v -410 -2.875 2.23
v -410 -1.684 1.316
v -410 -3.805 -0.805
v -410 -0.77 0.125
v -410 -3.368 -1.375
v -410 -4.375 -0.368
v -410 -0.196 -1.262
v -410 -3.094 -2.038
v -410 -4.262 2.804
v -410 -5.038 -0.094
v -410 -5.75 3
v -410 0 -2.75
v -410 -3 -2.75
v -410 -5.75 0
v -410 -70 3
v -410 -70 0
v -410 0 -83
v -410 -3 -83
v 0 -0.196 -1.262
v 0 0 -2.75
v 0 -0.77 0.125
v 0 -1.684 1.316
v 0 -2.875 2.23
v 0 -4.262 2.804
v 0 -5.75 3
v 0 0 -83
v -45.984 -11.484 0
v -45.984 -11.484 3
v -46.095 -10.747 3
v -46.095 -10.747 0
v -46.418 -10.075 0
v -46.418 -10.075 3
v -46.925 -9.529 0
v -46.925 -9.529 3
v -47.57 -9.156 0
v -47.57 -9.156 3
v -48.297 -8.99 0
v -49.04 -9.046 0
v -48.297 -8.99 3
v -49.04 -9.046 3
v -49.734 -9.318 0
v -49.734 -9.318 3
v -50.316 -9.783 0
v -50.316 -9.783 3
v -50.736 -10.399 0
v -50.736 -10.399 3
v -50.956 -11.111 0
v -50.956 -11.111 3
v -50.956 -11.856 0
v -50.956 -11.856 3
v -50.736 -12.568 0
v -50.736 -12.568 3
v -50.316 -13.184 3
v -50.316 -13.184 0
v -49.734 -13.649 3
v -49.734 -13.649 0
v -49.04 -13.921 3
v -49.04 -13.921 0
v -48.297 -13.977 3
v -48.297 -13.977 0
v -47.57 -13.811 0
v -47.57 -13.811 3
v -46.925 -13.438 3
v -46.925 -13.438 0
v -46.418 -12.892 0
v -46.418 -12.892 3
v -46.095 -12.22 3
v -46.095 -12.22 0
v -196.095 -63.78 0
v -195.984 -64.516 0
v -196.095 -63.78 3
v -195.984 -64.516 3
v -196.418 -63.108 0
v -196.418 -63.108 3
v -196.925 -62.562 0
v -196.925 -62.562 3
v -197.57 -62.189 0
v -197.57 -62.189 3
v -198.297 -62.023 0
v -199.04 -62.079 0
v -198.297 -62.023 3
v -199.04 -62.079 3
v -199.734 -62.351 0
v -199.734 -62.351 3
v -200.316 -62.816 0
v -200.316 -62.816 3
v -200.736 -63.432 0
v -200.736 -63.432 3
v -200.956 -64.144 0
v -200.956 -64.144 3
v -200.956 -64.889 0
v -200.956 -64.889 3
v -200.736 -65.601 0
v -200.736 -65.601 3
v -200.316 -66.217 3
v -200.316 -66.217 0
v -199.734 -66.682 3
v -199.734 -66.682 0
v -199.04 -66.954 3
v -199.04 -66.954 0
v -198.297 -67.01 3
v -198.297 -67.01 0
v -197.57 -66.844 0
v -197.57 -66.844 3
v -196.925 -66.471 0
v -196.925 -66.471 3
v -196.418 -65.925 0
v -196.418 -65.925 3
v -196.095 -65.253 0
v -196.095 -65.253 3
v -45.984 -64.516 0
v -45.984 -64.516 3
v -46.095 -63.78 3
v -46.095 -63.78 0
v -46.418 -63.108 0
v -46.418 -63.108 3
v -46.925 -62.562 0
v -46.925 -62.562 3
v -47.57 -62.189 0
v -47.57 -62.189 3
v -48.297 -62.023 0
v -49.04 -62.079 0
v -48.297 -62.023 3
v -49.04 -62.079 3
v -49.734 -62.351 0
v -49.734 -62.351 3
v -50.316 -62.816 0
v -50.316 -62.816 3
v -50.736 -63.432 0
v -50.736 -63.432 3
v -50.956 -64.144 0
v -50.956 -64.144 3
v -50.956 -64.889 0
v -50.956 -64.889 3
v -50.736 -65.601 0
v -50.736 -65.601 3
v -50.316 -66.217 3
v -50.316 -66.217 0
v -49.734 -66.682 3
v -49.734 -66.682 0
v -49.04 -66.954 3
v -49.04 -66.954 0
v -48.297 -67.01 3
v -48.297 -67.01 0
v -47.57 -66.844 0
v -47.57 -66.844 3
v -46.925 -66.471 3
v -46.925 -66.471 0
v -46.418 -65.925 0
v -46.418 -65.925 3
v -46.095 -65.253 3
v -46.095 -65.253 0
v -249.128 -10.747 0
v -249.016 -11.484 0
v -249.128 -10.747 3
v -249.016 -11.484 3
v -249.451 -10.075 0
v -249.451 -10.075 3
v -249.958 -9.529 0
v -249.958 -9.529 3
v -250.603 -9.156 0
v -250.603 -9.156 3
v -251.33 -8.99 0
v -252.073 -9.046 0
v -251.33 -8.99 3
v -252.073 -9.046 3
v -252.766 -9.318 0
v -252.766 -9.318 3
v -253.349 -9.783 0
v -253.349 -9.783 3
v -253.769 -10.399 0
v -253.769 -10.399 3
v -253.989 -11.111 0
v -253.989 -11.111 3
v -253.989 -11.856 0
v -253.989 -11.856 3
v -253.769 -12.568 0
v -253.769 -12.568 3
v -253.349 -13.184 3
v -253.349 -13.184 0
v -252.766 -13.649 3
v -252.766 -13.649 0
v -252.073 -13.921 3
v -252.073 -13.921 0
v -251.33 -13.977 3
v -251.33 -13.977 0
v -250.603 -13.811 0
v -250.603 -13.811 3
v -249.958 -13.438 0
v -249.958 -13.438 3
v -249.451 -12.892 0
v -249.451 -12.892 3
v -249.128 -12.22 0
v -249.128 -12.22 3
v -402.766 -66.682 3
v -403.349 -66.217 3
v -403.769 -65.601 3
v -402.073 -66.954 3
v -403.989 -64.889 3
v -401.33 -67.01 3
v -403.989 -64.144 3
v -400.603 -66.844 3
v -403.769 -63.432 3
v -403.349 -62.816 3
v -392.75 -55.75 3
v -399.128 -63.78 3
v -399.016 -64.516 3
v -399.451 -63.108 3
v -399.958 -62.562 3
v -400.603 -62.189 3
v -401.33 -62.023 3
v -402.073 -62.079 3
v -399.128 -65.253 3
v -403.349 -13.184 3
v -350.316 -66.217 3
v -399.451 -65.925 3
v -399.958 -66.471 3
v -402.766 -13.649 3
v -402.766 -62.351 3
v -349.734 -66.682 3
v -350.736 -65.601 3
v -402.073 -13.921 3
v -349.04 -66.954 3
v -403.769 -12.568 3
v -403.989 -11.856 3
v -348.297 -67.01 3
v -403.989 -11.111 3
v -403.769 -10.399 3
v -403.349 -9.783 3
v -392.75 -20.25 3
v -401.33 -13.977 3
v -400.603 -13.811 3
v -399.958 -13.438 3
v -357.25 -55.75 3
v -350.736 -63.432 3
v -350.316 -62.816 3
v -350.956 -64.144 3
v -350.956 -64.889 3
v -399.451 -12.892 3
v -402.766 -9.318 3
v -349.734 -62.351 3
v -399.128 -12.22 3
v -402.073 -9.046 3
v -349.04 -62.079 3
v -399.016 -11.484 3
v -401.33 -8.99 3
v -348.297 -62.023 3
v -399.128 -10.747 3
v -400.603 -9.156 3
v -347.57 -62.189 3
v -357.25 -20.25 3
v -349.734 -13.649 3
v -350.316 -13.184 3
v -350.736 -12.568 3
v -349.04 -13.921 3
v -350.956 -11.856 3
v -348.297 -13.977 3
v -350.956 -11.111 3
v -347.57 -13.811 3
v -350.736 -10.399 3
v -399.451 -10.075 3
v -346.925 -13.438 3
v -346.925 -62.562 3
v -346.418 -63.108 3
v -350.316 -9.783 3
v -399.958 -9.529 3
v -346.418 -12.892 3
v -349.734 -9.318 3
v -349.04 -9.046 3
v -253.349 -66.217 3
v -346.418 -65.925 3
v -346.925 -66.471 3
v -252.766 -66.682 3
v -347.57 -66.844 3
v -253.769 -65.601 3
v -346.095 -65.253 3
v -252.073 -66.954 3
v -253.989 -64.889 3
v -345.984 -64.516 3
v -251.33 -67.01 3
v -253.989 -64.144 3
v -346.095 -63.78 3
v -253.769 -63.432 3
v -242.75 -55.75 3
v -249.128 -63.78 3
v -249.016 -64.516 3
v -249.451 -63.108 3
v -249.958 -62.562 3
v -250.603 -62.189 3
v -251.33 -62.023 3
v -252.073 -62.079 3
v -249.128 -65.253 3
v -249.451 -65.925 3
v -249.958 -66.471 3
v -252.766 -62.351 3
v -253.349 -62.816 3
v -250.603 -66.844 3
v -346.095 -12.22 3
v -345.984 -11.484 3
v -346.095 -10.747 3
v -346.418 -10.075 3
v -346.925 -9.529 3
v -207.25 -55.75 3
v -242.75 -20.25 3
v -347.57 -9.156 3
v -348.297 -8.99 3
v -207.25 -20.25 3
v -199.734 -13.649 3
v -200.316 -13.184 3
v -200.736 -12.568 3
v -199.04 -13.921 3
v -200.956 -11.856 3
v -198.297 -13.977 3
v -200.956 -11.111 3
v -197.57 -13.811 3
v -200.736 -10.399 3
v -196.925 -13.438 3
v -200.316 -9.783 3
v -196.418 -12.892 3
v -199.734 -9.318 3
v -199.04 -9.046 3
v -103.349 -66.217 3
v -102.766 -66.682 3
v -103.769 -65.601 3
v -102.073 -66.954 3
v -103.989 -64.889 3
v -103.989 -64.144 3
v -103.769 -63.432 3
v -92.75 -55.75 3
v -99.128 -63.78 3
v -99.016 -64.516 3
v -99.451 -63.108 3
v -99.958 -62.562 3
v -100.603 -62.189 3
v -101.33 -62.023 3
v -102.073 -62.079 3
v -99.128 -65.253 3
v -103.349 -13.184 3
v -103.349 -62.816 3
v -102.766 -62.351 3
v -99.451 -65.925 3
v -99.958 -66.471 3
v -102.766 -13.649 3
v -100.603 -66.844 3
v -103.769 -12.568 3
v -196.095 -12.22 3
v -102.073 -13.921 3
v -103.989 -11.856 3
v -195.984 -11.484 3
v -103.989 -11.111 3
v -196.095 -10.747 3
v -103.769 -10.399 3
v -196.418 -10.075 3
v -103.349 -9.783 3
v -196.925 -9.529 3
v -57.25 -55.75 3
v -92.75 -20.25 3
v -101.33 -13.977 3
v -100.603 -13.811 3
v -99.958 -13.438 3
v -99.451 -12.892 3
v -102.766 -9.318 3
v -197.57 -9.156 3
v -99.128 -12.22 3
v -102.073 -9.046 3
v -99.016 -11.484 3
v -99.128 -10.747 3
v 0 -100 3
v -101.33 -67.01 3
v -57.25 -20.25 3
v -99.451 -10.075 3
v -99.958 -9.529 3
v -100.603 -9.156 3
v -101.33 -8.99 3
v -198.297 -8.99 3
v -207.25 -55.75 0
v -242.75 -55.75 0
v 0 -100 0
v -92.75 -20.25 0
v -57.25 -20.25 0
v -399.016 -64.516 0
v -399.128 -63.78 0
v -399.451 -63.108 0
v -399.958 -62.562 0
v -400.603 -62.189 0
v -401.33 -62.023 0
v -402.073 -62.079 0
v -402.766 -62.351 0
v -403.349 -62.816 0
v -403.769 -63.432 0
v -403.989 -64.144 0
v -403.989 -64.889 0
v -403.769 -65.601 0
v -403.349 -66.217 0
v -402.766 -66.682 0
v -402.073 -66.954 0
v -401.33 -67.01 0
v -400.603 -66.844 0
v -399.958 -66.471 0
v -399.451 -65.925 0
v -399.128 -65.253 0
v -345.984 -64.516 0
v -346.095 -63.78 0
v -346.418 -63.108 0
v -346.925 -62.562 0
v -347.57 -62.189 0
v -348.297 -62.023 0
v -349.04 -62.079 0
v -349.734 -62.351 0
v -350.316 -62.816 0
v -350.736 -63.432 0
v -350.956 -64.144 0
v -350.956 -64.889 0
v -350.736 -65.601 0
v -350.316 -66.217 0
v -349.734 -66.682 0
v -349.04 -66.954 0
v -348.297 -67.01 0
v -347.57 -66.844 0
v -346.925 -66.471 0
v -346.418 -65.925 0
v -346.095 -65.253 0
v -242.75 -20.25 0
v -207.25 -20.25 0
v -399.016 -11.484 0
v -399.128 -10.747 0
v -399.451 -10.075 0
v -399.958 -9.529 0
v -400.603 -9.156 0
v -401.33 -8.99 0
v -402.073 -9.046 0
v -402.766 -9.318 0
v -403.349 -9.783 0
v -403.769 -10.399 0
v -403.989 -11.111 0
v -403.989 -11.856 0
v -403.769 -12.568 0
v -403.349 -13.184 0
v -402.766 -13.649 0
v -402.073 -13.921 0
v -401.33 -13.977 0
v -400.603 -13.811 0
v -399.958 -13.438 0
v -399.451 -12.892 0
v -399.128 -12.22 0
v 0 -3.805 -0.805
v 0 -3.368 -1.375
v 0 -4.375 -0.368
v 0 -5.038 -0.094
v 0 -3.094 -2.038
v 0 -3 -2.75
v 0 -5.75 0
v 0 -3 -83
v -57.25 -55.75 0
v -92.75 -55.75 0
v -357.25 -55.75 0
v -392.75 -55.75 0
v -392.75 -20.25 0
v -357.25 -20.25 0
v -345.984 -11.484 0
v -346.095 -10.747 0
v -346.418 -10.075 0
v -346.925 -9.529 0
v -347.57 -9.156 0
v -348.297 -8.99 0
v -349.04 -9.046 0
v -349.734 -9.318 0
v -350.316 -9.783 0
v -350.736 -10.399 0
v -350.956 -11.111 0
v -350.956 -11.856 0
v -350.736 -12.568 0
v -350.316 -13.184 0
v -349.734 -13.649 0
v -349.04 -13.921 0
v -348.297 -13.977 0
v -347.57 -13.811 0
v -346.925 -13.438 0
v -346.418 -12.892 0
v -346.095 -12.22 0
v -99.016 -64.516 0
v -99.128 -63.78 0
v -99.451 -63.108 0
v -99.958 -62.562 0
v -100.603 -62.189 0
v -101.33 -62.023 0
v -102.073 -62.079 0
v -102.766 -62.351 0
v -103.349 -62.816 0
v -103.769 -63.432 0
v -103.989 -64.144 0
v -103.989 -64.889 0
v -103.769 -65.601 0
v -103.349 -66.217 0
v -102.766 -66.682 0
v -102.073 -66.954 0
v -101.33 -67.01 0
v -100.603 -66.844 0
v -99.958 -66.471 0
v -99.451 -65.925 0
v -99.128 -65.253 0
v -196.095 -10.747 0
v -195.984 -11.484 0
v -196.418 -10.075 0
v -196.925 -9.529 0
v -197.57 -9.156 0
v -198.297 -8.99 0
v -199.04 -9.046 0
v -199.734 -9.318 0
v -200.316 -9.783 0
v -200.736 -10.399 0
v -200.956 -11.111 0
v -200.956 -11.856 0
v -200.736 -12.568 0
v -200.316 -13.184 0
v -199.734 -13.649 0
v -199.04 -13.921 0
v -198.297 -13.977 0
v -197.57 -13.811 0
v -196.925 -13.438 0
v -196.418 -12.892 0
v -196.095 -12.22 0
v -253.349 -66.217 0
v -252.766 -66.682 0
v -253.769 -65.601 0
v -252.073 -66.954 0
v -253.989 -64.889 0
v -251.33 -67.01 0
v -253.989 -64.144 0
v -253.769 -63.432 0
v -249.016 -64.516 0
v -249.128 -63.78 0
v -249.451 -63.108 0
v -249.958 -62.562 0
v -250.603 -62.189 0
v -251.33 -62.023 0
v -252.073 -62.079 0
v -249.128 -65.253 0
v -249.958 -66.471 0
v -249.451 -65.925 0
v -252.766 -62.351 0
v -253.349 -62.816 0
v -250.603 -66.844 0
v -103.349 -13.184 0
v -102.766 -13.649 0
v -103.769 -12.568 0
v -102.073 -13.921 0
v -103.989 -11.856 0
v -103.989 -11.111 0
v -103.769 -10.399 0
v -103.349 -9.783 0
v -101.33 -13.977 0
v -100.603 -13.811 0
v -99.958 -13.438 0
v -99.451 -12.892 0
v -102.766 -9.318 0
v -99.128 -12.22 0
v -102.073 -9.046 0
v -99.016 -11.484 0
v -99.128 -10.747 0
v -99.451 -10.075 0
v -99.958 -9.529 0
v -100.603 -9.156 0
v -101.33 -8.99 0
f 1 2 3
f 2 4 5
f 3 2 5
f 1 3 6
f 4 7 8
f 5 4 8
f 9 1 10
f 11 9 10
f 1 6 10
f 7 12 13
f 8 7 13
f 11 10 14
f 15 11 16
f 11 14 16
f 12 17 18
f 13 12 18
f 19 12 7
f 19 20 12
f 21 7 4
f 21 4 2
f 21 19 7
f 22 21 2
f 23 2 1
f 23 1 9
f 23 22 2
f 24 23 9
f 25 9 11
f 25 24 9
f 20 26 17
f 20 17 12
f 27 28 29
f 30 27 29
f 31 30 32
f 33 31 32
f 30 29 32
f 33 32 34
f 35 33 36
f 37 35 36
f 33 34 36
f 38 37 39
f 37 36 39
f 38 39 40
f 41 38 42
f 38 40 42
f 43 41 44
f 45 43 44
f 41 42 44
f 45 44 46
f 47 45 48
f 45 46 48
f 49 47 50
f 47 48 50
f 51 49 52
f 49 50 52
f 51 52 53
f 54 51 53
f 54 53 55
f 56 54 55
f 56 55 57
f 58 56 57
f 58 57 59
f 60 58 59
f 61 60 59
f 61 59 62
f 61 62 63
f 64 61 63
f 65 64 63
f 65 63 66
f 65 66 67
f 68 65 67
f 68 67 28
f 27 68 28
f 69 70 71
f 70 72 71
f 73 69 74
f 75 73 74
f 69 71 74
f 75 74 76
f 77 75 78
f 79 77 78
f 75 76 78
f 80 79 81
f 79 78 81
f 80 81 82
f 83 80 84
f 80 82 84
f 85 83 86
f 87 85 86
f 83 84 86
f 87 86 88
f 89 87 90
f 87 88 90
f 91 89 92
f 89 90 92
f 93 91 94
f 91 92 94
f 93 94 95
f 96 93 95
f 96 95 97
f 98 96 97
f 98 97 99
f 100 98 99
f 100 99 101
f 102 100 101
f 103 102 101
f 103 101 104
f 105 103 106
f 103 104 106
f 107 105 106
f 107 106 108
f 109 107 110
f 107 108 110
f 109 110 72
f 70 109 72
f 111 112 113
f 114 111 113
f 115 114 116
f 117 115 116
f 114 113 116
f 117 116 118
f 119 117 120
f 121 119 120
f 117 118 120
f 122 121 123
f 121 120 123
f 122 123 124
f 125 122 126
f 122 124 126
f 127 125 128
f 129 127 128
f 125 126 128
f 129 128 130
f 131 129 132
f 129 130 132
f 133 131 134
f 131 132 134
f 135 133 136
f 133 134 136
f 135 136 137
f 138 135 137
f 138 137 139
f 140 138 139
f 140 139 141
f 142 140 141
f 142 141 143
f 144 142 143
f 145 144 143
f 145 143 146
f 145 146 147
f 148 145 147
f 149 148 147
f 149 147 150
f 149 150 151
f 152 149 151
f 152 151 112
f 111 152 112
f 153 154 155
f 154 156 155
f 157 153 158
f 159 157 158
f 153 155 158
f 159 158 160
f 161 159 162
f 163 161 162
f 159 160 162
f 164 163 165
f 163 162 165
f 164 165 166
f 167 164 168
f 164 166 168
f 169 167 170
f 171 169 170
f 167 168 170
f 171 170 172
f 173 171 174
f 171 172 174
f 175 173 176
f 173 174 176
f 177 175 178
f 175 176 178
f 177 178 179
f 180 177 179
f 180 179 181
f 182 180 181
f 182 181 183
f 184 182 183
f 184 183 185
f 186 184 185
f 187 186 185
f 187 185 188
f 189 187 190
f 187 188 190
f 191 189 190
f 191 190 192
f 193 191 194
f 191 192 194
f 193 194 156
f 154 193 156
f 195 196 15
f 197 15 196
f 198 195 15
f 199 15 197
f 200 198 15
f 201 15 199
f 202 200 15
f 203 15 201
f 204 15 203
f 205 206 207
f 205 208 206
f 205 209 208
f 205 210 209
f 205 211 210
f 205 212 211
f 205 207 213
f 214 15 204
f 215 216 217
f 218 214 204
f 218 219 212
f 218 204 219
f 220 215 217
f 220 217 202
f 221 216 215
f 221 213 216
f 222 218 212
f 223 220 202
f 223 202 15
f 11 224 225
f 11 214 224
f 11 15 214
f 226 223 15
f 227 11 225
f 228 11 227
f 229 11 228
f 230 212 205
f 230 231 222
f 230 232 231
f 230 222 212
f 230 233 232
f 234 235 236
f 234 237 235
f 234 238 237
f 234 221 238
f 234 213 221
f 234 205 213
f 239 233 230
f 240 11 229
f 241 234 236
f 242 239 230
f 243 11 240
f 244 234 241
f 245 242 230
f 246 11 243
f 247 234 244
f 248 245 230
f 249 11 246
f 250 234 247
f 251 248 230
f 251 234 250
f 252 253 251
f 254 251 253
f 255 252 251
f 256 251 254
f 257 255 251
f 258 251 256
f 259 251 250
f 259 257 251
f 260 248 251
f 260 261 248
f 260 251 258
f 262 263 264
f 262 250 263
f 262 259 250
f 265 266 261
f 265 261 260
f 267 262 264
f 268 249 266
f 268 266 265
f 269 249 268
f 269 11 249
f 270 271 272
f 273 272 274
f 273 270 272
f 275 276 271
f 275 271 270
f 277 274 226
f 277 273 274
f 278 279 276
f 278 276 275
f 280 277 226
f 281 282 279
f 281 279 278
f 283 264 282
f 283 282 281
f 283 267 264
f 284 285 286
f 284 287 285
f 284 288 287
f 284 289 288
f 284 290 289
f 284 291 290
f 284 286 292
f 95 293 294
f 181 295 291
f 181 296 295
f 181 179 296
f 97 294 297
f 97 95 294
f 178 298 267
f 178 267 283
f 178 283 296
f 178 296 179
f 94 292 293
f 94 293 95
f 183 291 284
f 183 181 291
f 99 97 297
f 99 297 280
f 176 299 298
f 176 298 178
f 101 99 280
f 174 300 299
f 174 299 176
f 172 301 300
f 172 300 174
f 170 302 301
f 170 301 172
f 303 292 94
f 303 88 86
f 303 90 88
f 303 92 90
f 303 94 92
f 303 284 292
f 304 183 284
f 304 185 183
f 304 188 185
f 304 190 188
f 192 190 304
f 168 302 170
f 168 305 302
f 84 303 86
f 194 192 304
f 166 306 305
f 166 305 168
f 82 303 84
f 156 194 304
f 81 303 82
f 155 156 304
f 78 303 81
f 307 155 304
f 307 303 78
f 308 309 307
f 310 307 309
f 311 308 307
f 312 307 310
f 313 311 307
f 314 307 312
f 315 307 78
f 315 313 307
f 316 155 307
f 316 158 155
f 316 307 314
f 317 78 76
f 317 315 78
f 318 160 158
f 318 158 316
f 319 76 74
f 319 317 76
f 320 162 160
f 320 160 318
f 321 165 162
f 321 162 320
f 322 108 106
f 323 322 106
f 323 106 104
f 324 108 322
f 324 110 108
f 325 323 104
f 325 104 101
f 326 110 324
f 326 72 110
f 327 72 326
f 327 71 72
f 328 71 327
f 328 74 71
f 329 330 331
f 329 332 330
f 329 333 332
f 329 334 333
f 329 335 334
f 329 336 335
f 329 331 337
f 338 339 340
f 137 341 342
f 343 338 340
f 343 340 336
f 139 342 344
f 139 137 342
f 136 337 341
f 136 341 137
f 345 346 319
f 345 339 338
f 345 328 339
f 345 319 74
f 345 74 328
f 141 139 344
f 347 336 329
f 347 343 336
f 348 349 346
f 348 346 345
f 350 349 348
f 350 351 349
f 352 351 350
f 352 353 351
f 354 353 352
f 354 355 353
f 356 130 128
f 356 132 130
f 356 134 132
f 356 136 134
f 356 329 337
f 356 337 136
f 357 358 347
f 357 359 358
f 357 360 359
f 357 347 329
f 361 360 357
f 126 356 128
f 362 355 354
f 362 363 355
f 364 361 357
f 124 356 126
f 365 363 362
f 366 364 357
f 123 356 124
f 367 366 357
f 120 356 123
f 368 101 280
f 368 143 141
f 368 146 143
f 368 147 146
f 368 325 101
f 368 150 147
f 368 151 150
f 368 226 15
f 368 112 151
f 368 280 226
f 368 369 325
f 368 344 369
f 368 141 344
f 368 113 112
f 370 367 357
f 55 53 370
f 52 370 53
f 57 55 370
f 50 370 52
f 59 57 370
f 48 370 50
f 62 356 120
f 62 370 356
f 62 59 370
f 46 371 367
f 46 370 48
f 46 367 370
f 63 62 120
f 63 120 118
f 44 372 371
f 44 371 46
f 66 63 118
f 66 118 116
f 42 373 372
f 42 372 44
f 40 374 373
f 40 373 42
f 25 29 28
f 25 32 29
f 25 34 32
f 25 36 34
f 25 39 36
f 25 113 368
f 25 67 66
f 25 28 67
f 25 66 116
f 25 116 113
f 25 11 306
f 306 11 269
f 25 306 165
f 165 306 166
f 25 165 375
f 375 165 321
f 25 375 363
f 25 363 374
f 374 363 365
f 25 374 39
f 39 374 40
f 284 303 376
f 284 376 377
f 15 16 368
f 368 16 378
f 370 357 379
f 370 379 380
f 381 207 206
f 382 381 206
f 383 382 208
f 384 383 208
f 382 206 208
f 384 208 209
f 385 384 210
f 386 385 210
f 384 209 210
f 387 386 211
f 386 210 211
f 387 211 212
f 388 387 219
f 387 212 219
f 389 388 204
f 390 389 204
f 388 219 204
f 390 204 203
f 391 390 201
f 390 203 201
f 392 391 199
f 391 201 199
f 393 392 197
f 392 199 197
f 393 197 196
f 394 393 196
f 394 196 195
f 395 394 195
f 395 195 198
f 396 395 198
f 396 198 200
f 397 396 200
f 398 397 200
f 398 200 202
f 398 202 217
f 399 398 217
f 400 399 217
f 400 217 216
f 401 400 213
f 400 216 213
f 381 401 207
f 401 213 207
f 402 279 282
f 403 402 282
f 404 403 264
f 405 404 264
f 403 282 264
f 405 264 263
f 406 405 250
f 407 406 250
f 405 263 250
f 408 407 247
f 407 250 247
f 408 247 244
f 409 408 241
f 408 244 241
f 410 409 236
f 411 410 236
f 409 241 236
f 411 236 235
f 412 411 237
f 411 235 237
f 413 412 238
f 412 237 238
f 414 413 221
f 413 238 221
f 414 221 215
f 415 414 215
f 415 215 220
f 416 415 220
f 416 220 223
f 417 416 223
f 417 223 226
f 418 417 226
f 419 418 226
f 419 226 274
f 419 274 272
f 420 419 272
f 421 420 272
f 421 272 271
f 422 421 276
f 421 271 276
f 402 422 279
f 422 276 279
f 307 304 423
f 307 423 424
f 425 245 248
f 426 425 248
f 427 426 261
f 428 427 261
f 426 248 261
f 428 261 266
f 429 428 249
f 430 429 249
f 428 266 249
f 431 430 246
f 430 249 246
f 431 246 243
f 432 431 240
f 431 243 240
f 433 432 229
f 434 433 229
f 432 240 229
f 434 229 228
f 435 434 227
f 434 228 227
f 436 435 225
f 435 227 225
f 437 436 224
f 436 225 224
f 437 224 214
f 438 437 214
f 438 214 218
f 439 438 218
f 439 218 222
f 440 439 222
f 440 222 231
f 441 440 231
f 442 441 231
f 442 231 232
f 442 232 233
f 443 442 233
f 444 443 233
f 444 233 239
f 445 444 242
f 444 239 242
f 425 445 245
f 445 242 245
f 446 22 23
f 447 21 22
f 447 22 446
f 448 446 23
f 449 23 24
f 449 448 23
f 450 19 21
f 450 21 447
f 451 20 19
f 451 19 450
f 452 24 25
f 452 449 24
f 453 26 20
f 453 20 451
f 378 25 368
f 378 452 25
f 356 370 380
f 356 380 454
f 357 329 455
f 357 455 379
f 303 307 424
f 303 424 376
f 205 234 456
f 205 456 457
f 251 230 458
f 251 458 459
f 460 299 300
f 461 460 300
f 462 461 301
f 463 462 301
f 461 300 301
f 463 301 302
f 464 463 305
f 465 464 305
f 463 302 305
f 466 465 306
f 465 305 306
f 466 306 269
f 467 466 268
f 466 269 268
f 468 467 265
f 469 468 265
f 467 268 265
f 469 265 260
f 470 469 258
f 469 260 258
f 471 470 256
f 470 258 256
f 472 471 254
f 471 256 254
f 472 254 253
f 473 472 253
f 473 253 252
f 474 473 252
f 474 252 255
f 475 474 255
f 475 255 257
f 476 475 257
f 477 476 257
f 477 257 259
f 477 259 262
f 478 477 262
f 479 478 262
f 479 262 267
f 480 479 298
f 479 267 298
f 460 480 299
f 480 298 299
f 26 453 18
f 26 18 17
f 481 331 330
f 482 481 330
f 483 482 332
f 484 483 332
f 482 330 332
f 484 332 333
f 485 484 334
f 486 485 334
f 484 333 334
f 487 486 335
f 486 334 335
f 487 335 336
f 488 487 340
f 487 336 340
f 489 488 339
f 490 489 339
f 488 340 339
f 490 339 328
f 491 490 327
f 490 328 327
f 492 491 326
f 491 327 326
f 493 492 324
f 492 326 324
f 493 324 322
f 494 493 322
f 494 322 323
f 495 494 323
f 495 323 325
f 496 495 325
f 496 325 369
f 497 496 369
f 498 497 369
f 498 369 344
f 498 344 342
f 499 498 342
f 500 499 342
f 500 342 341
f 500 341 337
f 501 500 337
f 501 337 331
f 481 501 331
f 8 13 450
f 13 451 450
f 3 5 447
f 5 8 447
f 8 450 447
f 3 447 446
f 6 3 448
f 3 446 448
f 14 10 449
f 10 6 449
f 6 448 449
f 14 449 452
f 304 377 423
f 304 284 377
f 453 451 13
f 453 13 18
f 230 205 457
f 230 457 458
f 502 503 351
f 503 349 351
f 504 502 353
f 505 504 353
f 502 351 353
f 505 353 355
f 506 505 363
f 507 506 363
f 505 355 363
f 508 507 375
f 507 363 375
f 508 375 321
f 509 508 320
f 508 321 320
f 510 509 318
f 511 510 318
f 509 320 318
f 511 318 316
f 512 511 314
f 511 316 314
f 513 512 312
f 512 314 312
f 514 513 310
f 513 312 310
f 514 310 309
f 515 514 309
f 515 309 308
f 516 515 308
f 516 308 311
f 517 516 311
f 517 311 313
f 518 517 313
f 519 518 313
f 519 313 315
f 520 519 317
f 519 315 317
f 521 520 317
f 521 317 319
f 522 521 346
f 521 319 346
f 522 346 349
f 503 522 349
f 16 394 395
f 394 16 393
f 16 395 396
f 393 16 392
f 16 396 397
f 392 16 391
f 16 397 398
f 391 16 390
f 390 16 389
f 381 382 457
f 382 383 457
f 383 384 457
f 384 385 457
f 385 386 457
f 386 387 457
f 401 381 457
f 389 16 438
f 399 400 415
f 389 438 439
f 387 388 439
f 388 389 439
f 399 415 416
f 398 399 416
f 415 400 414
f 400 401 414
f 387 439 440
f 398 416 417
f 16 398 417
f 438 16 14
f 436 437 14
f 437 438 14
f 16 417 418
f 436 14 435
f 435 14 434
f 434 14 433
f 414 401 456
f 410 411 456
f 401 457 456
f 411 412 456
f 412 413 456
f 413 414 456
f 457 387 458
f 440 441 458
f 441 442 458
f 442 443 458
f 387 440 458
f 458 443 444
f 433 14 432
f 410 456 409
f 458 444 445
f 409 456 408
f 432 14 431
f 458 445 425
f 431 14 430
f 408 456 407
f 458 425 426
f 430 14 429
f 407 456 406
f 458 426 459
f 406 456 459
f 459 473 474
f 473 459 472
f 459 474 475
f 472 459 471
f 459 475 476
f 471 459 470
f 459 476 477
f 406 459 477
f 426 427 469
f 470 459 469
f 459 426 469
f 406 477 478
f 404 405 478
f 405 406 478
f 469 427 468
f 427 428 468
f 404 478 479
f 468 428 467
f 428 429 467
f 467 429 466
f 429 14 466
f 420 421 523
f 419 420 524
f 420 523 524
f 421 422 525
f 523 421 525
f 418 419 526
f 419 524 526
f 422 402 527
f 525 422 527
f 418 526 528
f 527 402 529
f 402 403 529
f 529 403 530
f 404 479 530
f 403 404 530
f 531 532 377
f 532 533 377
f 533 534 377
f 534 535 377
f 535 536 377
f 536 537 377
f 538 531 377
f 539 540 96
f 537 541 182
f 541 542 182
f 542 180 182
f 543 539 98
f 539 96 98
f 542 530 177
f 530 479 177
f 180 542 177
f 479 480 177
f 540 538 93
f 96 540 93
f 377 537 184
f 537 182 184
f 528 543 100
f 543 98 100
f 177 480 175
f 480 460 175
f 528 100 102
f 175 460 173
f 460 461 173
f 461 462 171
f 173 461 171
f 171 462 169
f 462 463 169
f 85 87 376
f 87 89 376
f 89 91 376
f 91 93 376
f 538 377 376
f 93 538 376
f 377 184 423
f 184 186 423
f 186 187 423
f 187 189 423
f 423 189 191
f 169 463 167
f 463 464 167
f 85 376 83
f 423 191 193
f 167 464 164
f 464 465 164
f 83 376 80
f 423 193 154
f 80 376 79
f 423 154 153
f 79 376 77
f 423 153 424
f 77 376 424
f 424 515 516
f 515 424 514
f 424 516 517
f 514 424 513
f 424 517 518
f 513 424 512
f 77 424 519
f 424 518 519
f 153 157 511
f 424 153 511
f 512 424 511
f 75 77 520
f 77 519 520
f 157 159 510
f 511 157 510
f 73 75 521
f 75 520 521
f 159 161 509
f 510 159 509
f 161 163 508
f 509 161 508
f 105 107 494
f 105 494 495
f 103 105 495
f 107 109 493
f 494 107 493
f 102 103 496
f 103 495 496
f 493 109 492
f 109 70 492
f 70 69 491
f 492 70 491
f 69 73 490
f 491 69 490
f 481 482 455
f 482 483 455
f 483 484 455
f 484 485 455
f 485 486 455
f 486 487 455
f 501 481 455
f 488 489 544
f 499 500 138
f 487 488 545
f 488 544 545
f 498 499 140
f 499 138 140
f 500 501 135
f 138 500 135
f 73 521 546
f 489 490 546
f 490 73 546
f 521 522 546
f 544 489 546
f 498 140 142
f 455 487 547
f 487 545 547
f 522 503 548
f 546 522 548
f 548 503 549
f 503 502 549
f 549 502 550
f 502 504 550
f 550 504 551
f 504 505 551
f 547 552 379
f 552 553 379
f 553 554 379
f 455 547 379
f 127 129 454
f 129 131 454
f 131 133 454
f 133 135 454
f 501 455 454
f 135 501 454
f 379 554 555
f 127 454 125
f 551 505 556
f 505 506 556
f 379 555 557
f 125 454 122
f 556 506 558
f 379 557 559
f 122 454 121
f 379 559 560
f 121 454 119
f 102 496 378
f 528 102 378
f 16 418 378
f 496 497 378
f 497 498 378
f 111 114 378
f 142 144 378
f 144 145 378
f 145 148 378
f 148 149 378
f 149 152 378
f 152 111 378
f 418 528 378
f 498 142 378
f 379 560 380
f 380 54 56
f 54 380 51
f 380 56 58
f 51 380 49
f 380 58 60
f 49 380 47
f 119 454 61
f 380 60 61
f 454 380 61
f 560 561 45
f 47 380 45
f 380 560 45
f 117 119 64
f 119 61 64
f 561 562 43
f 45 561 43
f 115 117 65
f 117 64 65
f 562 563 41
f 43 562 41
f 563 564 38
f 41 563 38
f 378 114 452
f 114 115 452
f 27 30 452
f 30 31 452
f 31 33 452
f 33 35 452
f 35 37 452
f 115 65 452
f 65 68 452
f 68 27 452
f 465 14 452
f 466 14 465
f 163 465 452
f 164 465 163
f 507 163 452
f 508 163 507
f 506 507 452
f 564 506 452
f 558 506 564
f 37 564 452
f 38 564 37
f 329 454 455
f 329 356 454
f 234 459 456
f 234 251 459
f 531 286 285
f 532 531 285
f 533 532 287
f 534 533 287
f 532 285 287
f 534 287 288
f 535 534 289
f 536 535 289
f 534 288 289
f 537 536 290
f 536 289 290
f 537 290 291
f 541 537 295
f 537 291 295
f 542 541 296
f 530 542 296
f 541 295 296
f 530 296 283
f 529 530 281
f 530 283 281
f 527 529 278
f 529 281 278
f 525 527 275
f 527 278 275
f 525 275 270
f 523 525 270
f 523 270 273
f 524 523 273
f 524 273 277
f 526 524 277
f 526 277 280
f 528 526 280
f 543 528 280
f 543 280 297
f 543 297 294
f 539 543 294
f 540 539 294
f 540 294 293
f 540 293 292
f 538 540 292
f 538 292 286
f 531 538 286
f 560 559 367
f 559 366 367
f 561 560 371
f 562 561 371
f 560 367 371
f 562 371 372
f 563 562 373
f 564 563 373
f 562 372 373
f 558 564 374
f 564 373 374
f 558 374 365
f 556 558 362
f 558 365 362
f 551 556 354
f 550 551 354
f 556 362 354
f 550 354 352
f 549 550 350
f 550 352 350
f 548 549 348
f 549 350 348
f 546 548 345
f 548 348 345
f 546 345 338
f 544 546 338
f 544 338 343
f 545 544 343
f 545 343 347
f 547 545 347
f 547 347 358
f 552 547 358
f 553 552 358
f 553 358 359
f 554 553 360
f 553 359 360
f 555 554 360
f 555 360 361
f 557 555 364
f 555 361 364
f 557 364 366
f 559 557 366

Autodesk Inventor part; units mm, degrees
ref_plane "YZ Plane" through (0, 0, 0) normal (1, 0, 0) x (0, 1, 0)
ref_plane "XZ Plane" through (0, 0, 0) normal (0, 1, 0) x (-1, 0, 0)
ref_plane "XY Plane" through (0, 0, 0) normal (0, 0, 1) x (1, 0, 0)
sketch "Sketch1" plane through (0, 0, 0) normal (0, 0, 1) x (1, 0, 0)
  line L0 (0, 0) -> (-410, 0)
  line L1 (0, -100) -> (0, 0)
  line L2 (-410, 0) -> (-410, -70)
  line L3 (-410, -70) -> (0, -100)
  point P0 (0, -50)
  dimension "d32" = 100
  dimension "d60" = 70
  dimension "d61" = 410
extrude "Plate1" add sketch "Sketch1" along normal blind 3
sketch "Sketch8" plane through (0, 0, 3) normal (0, 0, 1) x (1, 0, 0)
  line L0 (-57.25, -55.75) -> (-92.75, -55.75)
  line L1 (-92.75, -55.75) -> (-92.75, -20.25)
  line L2 (-92.75, -20.25) -> (-57.25, -20.25)
  line L3 (-57.25, -20.25) -> (-57.25, -55.75)
  line L4 (-57.25, -55.75) -> (-92.75, -20.25) construction
  line L5 (-92.75, -55.75) -> (-57.25, -20.25) construction
  circle A0 centre (-48.4835, -64.5165) radius 2.5
  circle A1 centre (-101.5165, -64.5165) radius 2.5
  circle A2 centre (-101.5165, -11.4835) radius 2.5
  circle A3 centre (-48.4835, -11.4835) radius 2.5
  circle A4 centre (-75, -38) radius 37.5 construction
  line L6 (0, 0) -> (0, -100) projected
  line L7 (-410, 0) -> (0, 0) projected
  line L8 (-92.75, -55.75) -> (-101.5165, -64.5165) construction
  dimension "d51" = 35.5
  dimension "d52" = 35.5
  dimension "d53" = 5
  dimension "d72" = 75
  dimension "d73" = 38
  dimension "d74" = 12.3977
  dimension "d75" = 75
extrude "Cut3" cut sketch "Sketch8" against normal blind 3
pattern_linear "Rectangular Pattern1" count 3 spacing 150 along (-1, 0, 0) of "Cut3"
sketch "Sketch9" plane through (0, -3, 3) normal (0, 1, 0) x (-1, 0, 0)
  line L0 (410, 0) -> (0, 0)
  line L1 (0, 0) -> (0, -86)
  line L2 (0, -86) -> (410, -86)
  line L3 (410, -86) -> (410, 0)
edge flange "Flange3" height 86 angle 90 thickness 3 bend radius 2.75 thickness toward (0, 1, 0) relief round relief width 3 relief depth 1.5 edges at (-205, 0, 0) wall of the first edge with corners at (-410, -3, 3) (0, -3, 3) (0, -3, -83) (-410, -3, -83)
bend "Bend3"
corner "Corner3"
equation "\"d32\" = Main_way_hight"
equation "\"d61\" = Main_way_lenth"
equation "\"d51\" = d52"
equation "\"d55\" = Thickness"
equation "\"d2\" = Thickness"
equation "\"d62\" = BendReliefWidth"
equation "\"d63\" = BendReliefDepth"
equation "\"d64\" = MinimumRemnant"
equation "\"d65\" = TransitionRadius"
equation "\"d66\" = MAIN_7_central_window_width + 2 * Thickness"
equation "\"d68\" = BendRadius"
equation "\"d69\" = CornerReliefSize"
equation "\"d70\" = GapSize"
equation "\"d71\" = JacobiRadiusSize"
equation "\"BendReliefWidth\" = Thickness"
equation "\"BendReliefDepth\" = 0.5 * Thickness"
equation "\"CornerReliefSize\" = 4 * Thickness"
equation "\"MinimumRemnant\" = 2 * Thickness"
equation "\"TransitionRadius\" = BendRadius"
equation "\"JacobiRadiusSize\" = BendRadius"
equation "\"GapSize\" = Thickness"
equation "\"Main_way_hight\" = 100"
equation "\"Main_way_lenth\" = 410"
equation "\"Thickness\" = 3"
equation "\"MAIN_7_central_window_width\" = 80"
equation "\"BendRadius\" = 2.75"
properties part number "ANP 1422 BOTTOM FDS diameter way up" material "Stainless Steel"
